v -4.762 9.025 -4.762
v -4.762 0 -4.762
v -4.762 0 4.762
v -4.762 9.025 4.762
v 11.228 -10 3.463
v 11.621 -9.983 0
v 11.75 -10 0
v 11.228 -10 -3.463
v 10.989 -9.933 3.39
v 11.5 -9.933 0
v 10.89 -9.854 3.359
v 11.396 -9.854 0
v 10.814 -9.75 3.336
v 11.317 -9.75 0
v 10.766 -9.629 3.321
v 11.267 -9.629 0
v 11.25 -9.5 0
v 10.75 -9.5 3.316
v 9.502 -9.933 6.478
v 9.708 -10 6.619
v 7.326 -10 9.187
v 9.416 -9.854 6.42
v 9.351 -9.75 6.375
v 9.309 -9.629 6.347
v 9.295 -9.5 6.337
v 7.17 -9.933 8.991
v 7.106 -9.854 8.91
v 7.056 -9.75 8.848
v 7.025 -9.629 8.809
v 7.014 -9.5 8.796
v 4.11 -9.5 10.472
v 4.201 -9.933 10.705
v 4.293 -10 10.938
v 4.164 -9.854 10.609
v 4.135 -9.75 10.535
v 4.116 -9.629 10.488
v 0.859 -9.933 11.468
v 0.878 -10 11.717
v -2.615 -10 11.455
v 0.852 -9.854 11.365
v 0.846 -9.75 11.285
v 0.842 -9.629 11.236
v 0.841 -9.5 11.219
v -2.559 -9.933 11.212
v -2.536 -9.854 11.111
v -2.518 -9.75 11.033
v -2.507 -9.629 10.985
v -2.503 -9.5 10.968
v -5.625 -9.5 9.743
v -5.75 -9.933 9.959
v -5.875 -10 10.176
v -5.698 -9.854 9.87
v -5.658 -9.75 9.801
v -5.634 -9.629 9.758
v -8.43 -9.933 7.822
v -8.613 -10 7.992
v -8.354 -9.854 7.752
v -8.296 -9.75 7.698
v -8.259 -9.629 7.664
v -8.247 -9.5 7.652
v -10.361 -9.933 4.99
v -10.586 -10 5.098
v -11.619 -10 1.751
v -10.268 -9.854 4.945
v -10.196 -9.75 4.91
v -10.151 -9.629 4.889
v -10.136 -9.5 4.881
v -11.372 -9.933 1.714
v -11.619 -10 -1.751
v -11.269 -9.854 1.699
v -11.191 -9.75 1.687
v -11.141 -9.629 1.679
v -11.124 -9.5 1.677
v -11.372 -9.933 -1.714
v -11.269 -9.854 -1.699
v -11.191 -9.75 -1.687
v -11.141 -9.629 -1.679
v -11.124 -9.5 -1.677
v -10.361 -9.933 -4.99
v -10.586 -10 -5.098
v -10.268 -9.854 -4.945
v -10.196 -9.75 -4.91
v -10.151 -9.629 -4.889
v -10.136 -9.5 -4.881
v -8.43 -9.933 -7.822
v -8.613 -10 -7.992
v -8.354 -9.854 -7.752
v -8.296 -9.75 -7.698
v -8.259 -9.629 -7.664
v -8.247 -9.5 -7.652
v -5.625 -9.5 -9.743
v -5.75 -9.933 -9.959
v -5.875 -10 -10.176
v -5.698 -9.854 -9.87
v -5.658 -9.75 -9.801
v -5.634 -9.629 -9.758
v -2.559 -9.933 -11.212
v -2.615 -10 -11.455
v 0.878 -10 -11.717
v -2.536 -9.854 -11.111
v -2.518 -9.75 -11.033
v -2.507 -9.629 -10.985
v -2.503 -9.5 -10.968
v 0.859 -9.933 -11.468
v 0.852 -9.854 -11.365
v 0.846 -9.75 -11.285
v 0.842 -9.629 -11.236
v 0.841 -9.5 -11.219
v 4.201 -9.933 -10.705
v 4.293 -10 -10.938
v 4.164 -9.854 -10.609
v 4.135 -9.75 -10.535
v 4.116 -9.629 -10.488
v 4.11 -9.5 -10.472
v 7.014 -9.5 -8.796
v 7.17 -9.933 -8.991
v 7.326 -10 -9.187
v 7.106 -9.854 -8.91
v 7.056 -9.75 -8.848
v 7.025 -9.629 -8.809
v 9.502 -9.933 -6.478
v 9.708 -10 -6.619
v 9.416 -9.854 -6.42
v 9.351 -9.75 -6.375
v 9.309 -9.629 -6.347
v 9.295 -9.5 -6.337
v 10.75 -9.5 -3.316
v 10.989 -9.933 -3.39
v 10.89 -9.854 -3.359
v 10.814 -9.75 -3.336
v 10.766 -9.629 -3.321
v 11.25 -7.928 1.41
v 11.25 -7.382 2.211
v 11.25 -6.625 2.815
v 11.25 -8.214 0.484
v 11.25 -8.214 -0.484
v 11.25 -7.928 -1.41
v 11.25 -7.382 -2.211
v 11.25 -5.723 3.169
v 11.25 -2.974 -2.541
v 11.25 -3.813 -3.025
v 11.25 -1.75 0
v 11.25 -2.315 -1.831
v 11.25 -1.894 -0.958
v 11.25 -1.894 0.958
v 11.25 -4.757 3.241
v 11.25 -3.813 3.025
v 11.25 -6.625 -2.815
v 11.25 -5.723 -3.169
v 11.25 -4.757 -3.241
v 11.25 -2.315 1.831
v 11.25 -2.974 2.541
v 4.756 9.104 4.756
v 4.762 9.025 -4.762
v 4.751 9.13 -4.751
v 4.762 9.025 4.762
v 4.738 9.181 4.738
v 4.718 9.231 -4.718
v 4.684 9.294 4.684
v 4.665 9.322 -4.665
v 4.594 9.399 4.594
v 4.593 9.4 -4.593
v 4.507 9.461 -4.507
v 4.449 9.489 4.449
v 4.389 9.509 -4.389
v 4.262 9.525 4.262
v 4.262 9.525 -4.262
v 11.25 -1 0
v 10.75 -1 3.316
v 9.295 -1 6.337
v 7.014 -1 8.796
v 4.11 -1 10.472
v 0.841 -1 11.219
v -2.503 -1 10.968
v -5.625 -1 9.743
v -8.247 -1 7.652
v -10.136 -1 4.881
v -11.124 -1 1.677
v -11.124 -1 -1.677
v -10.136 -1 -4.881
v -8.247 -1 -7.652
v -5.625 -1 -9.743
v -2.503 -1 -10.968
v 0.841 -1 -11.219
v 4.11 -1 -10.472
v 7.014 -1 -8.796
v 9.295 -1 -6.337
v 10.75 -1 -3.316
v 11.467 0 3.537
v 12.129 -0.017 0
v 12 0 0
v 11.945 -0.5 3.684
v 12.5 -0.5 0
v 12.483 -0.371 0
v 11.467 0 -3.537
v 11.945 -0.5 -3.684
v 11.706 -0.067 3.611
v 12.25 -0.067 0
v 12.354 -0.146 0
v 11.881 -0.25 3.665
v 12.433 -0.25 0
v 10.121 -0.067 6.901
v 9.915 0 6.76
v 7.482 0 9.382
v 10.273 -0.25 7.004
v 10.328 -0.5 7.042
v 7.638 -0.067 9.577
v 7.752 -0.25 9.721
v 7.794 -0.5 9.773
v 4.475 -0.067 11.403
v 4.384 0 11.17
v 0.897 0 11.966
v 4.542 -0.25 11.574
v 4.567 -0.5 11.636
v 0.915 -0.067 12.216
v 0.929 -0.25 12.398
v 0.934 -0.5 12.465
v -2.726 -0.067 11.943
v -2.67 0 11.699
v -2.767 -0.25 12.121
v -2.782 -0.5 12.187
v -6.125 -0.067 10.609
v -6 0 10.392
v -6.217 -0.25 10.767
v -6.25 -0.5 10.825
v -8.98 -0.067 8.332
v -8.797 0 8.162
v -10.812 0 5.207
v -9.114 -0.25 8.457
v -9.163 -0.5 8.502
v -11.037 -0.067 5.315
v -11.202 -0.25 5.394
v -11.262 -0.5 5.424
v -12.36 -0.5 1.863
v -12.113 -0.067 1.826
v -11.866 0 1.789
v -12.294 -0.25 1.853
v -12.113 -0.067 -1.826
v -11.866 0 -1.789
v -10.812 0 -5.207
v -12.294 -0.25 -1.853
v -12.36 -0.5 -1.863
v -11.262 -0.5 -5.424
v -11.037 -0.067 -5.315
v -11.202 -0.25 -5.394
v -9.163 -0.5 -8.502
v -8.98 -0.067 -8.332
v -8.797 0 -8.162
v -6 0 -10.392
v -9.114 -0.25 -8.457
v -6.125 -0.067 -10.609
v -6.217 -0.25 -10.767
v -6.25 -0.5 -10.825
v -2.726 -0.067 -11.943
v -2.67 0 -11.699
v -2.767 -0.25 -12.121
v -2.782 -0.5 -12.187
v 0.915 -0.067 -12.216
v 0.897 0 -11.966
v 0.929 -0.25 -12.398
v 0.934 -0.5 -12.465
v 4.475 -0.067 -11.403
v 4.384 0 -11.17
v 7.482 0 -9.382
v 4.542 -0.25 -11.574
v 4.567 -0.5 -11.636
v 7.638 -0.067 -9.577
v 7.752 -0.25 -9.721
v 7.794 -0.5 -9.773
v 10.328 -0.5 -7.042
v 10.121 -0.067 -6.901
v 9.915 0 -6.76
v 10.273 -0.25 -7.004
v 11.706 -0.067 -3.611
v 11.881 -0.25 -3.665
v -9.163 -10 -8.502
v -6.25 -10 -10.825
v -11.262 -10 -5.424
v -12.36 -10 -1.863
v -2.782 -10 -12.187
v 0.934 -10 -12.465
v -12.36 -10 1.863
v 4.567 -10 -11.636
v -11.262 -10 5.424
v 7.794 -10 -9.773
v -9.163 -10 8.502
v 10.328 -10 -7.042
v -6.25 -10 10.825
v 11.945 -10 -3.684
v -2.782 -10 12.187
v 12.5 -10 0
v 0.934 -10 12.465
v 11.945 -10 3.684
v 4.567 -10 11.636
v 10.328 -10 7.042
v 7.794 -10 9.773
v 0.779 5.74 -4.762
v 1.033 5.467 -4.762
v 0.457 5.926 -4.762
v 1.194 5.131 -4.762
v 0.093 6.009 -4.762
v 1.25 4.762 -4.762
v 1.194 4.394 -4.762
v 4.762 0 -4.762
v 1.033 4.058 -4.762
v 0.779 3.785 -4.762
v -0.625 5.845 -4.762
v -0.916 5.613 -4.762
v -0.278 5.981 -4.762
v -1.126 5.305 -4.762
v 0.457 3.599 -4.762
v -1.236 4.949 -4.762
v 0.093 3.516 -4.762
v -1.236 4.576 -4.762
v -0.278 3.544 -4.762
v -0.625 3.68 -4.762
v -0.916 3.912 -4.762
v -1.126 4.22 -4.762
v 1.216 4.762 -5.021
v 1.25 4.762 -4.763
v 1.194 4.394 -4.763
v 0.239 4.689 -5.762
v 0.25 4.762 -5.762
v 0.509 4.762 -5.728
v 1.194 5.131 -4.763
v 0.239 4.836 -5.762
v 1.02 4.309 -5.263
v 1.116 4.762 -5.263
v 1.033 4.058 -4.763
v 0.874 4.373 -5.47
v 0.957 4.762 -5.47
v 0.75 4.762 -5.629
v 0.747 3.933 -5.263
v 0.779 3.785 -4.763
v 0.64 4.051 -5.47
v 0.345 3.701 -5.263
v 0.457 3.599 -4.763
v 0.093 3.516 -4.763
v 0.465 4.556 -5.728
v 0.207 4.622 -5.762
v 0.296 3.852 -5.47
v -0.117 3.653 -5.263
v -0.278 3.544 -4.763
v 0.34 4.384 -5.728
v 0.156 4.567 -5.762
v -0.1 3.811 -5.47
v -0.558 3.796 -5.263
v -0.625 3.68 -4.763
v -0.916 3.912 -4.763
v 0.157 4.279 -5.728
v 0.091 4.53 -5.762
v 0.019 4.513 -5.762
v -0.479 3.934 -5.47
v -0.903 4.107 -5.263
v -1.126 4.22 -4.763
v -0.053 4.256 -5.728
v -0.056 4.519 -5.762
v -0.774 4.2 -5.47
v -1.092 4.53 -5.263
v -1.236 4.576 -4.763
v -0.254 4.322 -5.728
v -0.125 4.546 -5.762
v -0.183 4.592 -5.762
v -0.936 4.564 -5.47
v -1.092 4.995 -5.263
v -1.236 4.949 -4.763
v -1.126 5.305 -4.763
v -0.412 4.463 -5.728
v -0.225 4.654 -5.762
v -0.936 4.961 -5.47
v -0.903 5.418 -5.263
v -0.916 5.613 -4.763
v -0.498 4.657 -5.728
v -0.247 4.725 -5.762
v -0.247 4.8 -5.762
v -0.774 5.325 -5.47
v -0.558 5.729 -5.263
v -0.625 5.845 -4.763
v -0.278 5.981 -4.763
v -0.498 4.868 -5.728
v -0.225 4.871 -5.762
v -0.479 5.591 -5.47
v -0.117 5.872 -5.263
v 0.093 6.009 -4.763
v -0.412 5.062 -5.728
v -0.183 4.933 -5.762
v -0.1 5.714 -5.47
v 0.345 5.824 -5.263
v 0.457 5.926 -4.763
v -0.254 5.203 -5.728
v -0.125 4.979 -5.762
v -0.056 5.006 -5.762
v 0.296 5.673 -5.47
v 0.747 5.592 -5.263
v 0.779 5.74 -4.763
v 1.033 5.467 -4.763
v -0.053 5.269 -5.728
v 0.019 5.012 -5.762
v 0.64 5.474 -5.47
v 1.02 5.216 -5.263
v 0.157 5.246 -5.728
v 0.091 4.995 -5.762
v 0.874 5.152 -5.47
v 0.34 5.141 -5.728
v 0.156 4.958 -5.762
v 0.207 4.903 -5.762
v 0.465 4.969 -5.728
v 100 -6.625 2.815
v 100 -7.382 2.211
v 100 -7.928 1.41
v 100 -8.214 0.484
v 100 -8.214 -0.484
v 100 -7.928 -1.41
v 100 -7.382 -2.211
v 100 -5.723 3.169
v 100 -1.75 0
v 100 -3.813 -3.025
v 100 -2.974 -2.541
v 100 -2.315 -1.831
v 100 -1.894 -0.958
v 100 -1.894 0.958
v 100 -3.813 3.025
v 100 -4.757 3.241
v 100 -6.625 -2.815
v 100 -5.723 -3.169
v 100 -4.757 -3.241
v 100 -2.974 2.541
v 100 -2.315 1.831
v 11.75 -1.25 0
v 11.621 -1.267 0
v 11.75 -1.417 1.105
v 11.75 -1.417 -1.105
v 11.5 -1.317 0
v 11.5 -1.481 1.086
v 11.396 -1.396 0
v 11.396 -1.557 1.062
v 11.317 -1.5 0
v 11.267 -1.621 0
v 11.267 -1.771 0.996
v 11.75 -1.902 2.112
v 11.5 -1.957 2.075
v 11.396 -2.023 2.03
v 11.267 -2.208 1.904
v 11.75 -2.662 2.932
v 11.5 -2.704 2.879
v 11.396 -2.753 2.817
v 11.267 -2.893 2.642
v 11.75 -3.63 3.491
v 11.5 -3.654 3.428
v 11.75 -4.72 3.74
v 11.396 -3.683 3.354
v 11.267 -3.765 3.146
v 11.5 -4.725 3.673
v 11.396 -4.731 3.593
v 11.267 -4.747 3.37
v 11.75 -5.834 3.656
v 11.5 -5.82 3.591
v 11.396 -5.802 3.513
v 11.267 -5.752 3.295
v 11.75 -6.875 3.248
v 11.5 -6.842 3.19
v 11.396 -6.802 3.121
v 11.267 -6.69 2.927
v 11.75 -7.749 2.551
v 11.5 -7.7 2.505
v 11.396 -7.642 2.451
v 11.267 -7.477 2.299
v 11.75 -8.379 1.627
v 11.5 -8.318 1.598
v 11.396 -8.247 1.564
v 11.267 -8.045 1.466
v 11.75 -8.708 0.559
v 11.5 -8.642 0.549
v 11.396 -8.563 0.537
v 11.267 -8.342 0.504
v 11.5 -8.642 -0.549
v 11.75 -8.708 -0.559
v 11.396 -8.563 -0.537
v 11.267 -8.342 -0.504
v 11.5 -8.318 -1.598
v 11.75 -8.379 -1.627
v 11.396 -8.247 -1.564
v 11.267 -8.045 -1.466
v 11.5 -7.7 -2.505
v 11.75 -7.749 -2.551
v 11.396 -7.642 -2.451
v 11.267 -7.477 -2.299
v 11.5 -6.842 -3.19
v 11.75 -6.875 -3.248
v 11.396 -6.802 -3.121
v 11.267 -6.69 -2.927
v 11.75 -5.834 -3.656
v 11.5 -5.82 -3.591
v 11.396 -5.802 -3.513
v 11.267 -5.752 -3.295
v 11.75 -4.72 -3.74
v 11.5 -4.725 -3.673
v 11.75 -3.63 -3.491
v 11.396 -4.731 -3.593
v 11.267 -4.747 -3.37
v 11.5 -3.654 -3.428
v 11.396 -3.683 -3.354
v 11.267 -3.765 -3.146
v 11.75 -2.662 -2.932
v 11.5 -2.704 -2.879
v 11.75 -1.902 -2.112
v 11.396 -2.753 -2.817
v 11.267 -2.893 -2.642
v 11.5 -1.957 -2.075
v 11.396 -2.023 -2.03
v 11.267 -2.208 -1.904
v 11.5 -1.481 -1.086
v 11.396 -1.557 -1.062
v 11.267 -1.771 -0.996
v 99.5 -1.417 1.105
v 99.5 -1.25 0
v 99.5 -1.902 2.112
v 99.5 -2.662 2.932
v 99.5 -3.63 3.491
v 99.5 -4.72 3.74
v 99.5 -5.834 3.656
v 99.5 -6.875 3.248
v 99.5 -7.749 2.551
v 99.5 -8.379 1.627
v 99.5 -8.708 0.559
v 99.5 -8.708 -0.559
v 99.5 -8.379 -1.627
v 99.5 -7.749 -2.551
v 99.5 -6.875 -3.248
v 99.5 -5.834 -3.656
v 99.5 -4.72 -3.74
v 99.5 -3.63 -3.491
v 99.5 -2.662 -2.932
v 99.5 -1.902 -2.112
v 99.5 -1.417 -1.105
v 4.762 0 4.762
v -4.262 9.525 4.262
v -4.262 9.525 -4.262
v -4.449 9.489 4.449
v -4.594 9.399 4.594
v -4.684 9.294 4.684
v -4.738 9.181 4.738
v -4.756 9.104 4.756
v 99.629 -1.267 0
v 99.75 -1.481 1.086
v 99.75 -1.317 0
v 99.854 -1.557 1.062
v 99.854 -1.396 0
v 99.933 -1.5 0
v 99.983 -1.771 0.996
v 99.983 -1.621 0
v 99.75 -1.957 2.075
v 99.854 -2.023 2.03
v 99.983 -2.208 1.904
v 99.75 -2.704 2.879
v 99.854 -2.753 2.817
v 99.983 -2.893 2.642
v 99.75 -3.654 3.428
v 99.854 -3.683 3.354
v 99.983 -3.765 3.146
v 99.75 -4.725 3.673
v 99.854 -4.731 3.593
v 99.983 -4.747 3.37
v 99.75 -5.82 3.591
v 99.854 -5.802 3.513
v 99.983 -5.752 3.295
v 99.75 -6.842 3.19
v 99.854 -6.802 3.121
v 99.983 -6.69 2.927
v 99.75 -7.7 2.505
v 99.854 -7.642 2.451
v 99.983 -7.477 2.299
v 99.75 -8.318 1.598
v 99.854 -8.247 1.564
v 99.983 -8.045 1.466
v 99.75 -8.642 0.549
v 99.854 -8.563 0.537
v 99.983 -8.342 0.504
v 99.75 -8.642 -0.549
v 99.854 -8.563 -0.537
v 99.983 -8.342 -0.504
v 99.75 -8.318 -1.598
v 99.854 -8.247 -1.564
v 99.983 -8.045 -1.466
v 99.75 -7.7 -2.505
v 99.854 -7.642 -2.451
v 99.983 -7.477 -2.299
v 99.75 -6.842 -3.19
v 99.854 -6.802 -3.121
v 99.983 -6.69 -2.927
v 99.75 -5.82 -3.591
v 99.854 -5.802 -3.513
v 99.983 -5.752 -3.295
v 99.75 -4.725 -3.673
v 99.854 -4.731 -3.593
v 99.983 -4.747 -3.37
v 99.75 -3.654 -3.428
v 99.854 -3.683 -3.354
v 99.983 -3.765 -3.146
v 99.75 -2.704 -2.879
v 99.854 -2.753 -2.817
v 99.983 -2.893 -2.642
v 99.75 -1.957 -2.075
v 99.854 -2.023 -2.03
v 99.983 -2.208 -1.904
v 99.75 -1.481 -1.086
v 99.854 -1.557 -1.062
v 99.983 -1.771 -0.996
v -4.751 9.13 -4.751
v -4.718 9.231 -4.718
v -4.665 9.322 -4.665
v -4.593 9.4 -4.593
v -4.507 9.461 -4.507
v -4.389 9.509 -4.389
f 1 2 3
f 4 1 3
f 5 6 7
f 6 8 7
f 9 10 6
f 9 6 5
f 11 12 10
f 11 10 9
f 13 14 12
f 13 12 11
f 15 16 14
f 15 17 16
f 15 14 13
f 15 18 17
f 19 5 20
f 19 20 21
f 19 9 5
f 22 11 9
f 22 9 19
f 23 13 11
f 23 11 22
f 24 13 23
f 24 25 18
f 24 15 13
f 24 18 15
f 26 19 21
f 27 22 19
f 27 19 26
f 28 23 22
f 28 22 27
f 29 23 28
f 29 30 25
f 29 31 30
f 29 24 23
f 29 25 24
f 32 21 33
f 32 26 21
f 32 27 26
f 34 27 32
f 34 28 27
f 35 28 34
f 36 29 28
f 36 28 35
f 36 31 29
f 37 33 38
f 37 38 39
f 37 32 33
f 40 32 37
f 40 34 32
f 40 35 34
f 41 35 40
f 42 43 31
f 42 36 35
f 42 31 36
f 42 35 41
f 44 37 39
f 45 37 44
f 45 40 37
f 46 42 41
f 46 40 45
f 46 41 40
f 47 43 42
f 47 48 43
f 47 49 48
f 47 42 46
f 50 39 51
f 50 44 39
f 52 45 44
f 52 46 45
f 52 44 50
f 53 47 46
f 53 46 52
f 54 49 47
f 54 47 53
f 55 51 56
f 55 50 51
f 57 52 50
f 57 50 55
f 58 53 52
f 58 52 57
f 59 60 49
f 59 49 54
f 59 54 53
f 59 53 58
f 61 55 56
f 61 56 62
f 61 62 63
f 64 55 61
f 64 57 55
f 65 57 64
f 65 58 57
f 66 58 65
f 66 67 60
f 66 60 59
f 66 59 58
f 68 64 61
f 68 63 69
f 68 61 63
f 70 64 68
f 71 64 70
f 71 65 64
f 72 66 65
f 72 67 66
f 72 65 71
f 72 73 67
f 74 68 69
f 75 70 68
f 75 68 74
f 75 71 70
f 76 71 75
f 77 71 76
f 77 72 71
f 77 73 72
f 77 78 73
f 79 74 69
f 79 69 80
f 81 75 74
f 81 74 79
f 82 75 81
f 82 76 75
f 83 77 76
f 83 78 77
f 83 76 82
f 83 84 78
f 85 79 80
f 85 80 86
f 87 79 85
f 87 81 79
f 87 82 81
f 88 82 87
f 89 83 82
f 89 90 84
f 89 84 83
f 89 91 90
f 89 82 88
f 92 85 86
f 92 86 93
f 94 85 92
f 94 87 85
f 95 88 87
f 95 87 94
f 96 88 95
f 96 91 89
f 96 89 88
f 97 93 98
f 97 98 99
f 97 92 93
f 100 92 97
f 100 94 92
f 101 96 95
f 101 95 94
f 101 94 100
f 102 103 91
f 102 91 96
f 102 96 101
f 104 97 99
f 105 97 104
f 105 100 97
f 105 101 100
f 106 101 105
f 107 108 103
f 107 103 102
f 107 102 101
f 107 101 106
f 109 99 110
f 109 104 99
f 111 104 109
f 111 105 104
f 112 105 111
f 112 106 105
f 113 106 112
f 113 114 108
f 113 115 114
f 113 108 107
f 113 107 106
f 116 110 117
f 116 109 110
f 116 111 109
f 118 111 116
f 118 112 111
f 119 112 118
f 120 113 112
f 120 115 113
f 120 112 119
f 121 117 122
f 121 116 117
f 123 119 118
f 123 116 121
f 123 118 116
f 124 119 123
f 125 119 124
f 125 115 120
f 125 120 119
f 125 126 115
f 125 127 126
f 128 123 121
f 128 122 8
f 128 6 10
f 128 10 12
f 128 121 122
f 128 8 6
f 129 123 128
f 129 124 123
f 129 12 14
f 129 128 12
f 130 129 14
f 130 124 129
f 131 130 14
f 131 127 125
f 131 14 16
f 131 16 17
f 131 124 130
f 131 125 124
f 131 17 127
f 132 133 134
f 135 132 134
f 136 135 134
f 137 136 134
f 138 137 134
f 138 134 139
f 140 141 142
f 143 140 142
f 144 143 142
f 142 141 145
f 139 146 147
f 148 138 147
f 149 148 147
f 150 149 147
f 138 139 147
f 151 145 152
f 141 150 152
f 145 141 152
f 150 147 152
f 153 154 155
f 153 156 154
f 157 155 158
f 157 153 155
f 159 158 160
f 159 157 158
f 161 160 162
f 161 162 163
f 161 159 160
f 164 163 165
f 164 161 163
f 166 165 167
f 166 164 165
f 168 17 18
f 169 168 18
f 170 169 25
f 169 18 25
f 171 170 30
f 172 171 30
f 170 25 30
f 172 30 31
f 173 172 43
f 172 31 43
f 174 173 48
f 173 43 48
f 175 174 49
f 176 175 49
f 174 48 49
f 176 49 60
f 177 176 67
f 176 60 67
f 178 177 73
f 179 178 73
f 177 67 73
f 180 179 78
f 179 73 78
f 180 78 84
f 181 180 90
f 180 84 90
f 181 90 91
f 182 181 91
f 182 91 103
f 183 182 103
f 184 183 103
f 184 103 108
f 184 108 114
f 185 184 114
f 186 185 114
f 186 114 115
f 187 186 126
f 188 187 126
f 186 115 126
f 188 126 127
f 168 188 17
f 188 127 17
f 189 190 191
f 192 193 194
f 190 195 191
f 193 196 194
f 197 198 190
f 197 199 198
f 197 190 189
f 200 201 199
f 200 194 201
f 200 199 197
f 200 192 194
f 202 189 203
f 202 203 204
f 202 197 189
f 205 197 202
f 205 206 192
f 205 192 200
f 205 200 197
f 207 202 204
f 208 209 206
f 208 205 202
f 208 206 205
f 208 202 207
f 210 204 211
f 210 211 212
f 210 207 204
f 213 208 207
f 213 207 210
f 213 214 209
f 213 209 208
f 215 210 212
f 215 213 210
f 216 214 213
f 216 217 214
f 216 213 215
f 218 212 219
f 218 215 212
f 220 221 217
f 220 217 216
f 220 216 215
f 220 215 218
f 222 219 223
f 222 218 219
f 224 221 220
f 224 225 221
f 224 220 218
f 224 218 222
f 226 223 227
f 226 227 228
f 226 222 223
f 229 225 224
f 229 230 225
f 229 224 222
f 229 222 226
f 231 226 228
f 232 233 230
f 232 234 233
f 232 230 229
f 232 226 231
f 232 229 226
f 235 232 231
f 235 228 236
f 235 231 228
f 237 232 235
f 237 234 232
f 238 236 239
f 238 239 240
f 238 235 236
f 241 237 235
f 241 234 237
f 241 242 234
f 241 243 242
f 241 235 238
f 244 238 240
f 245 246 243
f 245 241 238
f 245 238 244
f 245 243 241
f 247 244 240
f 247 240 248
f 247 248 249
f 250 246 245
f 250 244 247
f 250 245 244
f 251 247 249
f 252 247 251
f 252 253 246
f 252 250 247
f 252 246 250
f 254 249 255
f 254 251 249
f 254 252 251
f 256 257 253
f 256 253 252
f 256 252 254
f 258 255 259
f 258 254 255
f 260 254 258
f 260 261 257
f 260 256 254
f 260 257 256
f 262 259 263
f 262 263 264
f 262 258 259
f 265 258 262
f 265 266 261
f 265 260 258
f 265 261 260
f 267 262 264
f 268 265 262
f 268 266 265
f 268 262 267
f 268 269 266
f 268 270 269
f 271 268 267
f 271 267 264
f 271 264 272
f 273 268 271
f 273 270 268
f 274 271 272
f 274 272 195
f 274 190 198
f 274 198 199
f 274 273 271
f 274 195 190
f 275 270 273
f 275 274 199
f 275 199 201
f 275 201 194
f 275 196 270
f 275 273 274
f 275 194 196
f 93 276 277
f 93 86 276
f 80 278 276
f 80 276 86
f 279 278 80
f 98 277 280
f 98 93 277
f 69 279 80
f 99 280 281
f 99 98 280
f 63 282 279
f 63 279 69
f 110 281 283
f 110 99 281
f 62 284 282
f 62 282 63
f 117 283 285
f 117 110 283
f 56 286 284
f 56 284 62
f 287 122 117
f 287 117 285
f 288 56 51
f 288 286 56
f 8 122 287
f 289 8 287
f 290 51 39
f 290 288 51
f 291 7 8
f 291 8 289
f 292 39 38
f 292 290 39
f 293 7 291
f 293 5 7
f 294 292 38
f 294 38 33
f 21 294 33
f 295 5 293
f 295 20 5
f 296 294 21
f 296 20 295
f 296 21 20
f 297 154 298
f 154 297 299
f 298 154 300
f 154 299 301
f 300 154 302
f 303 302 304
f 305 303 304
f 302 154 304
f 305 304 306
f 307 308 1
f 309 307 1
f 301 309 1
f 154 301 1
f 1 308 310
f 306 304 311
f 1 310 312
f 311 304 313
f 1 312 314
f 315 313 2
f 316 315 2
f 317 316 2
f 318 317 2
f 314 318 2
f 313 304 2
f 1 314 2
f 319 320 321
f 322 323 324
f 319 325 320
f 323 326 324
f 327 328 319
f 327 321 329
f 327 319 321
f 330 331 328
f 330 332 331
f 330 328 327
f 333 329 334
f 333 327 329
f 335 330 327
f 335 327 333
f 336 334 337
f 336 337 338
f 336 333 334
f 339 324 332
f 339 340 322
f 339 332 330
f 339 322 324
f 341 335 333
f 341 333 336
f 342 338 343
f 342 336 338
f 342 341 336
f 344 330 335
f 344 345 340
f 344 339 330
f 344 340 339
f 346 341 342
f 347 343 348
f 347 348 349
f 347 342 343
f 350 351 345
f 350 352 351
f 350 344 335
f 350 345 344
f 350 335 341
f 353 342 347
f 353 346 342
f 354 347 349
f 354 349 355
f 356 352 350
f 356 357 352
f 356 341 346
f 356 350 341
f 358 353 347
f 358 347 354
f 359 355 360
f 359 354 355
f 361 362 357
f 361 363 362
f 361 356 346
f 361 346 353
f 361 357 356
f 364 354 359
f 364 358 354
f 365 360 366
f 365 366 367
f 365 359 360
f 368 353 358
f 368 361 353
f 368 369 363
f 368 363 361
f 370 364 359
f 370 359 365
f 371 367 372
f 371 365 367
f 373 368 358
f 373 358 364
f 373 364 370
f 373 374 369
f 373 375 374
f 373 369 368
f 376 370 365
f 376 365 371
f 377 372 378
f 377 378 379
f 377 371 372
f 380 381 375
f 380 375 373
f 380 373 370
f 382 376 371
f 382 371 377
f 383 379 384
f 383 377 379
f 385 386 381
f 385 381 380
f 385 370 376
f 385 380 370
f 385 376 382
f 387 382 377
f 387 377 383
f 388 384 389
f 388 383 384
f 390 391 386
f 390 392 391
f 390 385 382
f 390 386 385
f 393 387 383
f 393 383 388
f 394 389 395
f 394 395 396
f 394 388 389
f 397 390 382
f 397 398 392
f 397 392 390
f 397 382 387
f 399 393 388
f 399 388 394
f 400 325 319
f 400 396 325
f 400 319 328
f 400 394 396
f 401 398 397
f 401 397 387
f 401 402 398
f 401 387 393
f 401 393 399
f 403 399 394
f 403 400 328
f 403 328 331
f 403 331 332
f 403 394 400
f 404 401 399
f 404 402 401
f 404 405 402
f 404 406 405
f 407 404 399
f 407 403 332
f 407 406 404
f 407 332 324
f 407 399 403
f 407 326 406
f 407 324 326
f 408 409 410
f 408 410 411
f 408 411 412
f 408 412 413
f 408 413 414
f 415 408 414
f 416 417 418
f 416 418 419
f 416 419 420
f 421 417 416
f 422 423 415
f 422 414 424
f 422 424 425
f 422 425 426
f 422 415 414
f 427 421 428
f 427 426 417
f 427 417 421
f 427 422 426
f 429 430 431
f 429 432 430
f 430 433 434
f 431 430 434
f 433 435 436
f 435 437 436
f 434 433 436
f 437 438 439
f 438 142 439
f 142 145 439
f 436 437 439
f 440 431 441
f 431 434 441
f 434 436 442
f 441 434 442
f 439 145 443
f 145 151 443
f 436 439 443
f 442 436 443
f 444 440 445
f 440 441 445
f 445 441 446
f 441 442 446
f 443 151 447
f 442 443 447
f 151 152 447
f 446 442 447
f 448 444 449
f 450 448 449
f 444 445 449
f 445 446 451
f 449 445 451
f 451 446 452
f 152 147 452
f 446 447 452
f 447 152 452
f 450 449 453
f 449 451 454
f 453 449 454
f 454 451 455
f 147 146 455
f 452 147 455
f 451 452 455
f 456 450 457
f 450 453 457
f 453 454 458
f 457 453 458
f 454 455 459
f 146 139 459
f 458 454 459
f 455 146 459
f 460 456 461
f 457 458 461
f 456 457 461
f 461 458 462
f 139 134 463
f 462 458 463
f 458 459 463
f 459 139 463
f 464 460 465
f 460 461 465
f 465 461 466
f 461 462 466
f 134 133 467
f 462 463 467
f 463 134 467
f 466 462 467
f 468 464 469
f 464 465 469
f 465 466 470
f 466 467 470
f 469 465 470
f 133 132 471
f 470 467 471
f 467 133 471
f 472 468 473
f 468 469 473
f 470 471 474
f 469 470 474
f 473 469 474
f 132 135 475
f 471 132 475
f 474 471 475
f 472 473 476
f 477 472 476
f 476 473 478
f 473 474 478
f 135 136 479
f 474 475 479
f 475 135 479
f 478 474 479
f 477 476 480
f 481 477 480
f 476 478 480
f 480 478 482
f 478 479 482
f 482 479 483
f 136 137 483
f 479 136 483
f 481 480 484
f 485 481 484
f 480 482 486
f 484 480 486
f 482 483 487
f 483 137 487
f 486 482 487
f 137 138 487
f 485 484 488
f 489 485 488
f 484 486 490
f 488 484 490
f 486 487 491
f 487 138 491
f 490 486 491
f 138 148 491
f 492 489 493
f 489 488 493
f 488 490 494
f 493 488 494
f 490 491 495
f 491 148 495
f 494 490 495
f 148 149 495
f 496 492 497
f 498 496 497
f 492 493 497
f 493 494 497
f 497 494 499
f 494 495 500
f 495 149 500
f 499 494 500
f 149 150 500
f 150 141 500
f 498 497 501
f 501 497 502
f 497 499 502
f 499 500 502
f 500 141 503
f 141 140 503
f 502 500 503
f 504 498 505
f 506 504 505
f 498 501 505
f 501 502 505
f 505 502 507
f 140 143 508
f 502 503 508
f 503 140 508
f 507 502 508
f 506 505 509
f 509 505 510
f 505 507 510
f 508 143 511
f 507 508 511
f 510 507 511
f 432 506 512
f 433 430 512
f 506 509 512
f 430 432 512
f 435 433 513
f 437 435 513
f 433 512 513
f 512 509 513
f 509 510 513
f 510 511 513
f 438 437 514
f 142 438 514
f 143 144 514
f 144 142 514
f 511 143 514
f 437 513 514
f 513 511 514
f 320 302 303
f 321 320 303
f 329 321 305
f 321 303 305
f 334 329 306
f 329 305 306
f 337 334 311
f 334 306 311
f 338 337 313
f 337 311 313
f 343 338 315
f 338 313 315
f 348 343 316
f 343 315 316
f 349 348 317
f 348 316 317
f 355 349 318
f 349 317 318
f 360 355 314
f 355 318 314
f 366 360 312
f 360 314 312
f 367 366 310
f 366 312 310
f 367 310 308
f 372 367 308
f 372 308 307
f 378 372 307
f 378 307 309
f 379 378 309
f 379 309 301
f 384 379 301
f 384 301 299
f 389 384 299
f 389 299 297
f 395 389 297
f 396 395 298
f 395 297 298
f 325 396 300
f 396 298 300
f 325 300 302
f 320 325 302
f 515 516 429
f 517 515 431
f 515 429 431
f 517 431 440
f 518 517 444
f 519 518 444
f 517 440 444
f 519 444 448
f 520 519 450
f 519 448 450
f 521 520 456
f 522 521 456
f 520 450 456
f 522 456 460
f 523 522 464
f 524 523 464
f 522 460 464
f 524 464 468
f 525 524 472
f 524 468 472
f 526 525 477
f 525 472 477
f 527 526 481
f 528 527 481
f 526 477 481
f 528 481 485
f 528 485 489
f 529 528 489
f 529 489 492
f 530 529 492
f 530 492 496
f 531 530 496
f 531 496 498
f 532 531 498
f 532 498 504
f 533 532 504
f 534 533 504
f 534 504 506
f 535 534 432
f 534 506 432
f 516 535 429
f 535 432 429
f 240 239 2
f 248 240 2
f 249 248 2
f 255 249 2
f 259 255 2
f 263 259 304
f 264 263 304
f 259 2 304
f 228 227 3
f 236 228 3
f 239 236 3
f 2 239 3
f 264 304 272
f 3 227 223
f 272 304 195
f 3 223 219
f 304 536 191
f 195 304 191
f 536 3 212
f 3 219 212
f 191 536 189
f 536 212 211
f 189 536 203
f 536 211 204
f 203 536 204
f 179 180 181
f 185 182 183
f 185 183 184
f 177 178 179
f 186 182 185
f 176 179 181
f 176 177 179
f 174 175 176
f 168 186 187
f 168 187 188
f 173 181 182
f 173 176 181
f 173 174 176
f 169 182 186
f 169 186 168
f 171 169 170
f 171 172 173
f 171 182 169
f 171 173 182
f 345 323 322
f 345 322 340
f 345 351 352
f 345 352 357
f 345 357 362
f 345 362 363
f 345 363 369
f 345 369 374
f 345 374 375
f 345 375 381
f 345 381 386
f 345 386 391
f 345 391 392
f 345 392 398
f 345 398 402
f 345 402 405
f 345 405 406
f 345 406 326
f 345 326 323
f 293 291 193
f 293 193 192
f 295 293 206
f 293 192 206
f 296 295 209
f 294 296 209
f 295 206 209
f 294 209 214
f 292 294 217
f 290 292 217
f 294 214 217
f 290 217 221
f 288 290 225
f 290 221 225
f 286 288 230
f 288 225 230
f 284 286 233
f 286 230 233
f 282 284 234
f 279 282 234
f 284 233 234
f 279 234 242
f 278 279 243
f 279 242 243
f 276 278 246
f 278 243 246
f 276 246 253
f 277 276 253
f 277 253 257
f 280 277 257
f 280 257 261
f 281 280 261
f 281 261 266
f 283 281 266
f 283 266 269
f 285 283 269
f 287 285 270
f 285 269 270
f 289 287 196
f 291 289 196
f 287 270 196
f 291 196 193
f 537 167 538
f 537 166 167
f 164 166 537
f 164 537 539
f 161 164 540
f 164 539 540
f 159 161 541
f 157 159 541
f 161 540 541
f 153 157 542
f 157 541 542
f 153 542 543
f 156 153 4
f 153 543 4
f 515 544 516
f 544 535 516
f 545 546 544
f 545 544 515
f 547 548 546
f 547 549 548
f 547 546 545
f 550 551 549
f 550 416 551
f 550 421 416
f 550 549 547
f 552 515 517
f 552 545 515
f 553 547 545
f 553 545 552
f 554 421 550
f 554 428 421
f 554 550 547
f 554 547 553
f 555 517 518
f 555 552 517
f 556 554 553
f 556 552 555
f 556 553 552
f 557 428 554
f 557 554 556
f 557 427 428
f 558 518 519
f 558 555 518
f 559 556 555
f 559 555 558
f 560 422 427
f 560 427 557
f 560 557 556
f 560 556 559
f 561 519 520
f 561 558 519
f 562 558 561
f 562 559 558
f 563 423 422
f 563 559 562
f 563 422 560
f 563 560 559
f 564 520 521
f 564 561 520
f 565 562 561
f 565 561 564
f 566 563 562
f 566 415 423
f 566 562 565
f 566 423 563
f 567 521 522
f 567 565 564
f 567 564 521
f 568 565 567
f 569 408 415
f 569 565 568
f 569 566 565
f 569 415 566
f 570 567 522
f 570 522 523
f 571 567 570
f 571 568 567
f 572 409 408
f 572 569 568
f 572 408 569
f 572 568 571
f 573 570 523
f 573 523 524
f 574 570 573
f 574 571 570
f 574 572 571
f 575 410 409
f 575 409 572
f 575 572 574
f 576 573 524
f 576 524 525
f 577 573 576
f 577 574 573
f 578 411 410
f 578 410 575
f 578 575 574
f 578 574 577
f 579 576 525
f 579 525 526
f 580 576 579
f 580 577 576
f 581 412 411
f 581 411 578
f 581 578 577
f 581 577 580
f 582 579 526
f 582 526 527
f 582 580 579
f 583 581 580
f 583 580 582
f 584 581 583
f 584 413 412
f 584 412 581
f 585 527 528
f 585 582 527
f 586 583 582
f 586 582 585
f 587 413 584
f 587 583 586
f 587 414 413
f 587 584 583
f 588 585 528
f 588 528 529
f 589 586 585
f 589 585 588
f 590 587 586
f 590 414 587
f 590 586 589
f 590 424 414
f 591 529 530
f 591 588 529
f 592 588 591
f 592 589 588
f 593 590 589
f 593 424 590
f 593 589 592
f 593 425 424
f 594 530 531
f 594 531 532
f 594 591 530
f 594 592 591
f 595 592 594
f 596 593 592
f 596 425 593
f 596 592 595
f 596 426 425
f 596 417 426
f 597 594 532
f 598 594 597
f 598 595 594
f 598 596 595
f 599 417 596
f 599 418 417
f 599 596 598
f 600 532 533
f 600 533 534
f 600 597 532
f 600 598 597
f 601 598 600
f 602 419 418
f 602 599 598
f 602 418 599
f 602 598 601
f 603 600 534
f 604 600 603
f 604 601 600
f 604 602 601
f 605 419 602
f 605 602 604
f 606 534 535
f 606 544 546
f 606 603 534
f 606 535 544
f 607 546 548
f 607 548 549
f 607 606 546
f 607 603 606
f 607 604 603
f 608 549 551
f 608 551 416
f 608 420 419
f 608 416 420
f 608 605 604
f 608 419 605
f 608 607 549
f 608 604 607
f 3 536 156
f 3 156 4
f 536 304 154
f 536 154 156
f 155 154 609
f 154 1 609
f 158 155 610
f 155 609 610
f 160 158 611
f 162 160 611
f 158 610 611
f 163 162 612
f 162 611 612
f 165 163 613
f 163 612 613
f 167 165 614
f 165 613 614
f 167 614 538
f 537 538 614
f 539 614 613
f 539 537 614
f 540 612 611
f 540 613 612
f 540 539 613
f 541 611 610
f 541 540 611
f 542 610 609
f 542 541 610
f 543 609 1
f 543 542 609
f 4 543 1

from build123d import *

# Parameters (mm, degrees)
F0_R     = 12.5
F1_DEPTH = 10
F2_R     = 11.25
F3_DEPTH = 9
F4_W     = 9.525
F4_H     = 9.525
F5_DEPTH = 9.525
F7_START = 11.25
F6_R     = 3.75
F7_DEPTH = 88.75
F8_R     = 1.25
F9_DEPTH = 1
F10_R    = 0.99999
F11_R    = 0.5
F11_2_R  = 0.5


# Not quite as in the source:
# - a fillet or chamfer is up to 0.001 mm smaller than in the source, because OpenCascade refuses the exact size


with BuildPart() as f1:
    # F0 (on Front) → F1 (new body)
    with BuildSketch(Plane.XZ):
        Circle(F0_R)
    extrude(amount=F1_DEPTH)

    # F2 (on face) → F3 (cut)
    with BuildSketch(Plane.XZ.offset(10)):
        Circle(F2_R)
    extrude(amount=-F3_DEPTH, mode=Mode.SUBTRACT)

    # F4 (on face) → F5 (join)
    with BuildSketch(Plane(origin=(0, 0, 0), x_dir=(-1, 0, 0), z_dir=(0, 1, 0))):
        Rectangle(F4_W, F4_H)
    extrude(amount=F5_DEPTH)

    # F8 (on face) → F9 (join)
    with BuildSketch(Plane(origin=(0, 0, -4.7625), x_dir=(1, 0, 0), z_dir=(0, 0, -1))):
        with Locations((0, -4.7625)):
            Circle(F8_R)
    extrude(amount=F9_DEPTH)

    # F10 (radius 1 in the source; OpenCascade refuses exactly that, so slightly less here)
    f10_edges = [f1.edges().sort_by_distance(p)[0] for p in [
        (-1.25, 4.7625, -5.7625),
    ]]
    fillet(f10_edges, radius=F10_R)

    # F11
    f11_edges = [f1.edges().sort_by_distance(p)[0] for p in [
        (0, 9.525, -4.7625),
        (-4.7625, 9.525, 0),
        (0, 9.525, 4.7625),
        (4.7625, 9.525, 0),
        (-11.25, -10, 0),
        (-12.5, 0, 0),
    ]]
    fillet(f11_edges, radius=F11_R)


with BuildPart() as f7:
    # F6 (on Right) → F7 (new body)
    with BuildSketch(Plane.YZ.offset(F7_START)):
        with Locations((-5, 0)):
            Circle(F6_R)
    extrude(amount=F7_DEPTH)

    # F11#2
    f11_2_edges = [f7.edges().sort_by_distance(p)[0] for p in [
        (55.625, -1.25, 0),
        (11.25, -8.75, 0),
        (100, -8.75, 0),
    ]]
    fillet(f11_2_edges, radius=F11_2_R)


solid = Compound([f1.part, f7.part])
